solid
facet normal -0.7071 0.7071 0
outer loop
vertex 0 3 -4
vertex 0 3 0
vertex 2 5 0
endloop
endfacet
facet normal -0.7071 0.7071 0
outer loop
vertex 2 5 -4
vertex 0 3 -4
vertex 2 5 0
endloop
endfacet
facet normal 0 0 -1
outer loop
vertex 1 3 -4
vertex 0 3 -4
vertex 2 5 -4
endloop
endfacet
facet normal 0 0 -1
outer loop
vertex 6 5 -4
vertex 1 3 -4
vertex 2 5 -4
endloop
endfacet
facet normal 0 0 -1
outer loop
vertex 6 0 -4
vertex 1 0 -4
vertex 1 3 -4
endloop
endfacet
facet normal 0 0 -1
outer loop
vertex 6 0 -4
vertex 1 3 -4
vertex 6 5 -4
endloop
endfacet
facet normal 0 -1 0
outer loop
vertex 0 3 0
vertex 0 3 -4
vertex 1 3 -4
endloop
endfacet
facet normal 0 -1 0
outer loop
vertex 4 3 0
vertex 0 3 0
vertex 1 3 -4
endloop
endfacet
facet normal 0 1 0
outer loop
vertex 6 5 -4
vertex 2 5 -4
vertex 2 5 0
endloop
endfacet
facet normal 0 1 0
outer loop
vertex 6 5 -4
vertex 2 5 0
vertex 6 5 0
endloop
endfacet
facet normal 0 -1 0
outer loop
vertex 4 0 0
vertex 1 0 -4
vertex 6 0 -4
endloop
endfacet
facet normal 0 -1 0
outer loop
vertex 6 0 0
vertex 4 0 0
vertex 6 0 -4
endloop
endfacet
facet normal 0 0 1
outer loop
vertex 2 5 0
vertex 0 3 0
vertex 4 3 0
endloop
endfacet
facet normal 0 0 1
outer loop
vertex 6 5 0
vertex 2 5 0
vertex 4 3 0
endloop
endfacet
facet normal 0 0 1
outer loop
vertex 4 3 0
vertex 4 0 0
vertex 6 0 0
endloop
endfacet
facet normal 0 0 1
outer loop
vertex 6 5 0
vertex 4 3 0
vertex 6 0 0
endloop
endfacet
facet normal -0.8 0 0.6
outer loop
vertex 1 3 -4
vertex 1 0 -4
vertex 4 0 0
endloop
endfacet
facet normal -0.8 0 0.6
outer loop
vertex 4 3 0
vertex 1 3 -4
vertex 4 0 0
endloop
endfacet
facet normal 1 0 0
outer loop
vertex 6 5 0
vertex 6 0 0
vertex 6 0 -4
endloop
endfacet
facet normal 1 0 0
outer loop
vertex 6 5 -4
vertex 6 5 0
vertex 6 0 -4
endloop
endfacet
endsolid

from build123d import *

# Parameters (mm, degrees)
SKETCH2_W           = 6
SKETCH2_H           = 4
BOSS_EXTRUDE1_DEPTH = 5
SKETCH3_W           = 1
SKETCH3_H           = 3
CUT_EXTRUDE1_DEPTH  = 5
CUT_EXTRUDE2_DEPTH  = 3


with BuildPart() as part:
    # Sketch2 → Boss-Extrude1 (new body)
    with BuildSketch(Plane(origin=(0, 0, 0), x_dir=(1, 0, 0), z_dir=(0, 1, 0))):
        with Locations((3, 2)):
            Rectangle(SKETCH2_W, SKETCH2_H)
    extrude(amount=BOSS_EXTRUDE1_DEPTH)

    # Sketch3 → Cut-Extrude1 (cut)
    with BuildSketch(Plane.XY):
        Polygon((0, 5), (0, 3), (2, 5), align=None)
        with Locations((0.5, 1.5)):
            Rectangle(SKETCH3_W, SKETCH3_H)
    extrude(amount=-CUT_EXTRUDE1_DEPTH, mode=Mode.SUBTRACT)

    # Sketch4 → Cut-Extrude2 (cut)
    with BuildSketch(Plane.XZ):
        Polygon((1, -4), (4, 0), (1, 0), align=None)
    extrude(amount=-CUT_EXTRUDE2_DEPTH, mode=Mode.SUBTRACT)


solid = part.part
